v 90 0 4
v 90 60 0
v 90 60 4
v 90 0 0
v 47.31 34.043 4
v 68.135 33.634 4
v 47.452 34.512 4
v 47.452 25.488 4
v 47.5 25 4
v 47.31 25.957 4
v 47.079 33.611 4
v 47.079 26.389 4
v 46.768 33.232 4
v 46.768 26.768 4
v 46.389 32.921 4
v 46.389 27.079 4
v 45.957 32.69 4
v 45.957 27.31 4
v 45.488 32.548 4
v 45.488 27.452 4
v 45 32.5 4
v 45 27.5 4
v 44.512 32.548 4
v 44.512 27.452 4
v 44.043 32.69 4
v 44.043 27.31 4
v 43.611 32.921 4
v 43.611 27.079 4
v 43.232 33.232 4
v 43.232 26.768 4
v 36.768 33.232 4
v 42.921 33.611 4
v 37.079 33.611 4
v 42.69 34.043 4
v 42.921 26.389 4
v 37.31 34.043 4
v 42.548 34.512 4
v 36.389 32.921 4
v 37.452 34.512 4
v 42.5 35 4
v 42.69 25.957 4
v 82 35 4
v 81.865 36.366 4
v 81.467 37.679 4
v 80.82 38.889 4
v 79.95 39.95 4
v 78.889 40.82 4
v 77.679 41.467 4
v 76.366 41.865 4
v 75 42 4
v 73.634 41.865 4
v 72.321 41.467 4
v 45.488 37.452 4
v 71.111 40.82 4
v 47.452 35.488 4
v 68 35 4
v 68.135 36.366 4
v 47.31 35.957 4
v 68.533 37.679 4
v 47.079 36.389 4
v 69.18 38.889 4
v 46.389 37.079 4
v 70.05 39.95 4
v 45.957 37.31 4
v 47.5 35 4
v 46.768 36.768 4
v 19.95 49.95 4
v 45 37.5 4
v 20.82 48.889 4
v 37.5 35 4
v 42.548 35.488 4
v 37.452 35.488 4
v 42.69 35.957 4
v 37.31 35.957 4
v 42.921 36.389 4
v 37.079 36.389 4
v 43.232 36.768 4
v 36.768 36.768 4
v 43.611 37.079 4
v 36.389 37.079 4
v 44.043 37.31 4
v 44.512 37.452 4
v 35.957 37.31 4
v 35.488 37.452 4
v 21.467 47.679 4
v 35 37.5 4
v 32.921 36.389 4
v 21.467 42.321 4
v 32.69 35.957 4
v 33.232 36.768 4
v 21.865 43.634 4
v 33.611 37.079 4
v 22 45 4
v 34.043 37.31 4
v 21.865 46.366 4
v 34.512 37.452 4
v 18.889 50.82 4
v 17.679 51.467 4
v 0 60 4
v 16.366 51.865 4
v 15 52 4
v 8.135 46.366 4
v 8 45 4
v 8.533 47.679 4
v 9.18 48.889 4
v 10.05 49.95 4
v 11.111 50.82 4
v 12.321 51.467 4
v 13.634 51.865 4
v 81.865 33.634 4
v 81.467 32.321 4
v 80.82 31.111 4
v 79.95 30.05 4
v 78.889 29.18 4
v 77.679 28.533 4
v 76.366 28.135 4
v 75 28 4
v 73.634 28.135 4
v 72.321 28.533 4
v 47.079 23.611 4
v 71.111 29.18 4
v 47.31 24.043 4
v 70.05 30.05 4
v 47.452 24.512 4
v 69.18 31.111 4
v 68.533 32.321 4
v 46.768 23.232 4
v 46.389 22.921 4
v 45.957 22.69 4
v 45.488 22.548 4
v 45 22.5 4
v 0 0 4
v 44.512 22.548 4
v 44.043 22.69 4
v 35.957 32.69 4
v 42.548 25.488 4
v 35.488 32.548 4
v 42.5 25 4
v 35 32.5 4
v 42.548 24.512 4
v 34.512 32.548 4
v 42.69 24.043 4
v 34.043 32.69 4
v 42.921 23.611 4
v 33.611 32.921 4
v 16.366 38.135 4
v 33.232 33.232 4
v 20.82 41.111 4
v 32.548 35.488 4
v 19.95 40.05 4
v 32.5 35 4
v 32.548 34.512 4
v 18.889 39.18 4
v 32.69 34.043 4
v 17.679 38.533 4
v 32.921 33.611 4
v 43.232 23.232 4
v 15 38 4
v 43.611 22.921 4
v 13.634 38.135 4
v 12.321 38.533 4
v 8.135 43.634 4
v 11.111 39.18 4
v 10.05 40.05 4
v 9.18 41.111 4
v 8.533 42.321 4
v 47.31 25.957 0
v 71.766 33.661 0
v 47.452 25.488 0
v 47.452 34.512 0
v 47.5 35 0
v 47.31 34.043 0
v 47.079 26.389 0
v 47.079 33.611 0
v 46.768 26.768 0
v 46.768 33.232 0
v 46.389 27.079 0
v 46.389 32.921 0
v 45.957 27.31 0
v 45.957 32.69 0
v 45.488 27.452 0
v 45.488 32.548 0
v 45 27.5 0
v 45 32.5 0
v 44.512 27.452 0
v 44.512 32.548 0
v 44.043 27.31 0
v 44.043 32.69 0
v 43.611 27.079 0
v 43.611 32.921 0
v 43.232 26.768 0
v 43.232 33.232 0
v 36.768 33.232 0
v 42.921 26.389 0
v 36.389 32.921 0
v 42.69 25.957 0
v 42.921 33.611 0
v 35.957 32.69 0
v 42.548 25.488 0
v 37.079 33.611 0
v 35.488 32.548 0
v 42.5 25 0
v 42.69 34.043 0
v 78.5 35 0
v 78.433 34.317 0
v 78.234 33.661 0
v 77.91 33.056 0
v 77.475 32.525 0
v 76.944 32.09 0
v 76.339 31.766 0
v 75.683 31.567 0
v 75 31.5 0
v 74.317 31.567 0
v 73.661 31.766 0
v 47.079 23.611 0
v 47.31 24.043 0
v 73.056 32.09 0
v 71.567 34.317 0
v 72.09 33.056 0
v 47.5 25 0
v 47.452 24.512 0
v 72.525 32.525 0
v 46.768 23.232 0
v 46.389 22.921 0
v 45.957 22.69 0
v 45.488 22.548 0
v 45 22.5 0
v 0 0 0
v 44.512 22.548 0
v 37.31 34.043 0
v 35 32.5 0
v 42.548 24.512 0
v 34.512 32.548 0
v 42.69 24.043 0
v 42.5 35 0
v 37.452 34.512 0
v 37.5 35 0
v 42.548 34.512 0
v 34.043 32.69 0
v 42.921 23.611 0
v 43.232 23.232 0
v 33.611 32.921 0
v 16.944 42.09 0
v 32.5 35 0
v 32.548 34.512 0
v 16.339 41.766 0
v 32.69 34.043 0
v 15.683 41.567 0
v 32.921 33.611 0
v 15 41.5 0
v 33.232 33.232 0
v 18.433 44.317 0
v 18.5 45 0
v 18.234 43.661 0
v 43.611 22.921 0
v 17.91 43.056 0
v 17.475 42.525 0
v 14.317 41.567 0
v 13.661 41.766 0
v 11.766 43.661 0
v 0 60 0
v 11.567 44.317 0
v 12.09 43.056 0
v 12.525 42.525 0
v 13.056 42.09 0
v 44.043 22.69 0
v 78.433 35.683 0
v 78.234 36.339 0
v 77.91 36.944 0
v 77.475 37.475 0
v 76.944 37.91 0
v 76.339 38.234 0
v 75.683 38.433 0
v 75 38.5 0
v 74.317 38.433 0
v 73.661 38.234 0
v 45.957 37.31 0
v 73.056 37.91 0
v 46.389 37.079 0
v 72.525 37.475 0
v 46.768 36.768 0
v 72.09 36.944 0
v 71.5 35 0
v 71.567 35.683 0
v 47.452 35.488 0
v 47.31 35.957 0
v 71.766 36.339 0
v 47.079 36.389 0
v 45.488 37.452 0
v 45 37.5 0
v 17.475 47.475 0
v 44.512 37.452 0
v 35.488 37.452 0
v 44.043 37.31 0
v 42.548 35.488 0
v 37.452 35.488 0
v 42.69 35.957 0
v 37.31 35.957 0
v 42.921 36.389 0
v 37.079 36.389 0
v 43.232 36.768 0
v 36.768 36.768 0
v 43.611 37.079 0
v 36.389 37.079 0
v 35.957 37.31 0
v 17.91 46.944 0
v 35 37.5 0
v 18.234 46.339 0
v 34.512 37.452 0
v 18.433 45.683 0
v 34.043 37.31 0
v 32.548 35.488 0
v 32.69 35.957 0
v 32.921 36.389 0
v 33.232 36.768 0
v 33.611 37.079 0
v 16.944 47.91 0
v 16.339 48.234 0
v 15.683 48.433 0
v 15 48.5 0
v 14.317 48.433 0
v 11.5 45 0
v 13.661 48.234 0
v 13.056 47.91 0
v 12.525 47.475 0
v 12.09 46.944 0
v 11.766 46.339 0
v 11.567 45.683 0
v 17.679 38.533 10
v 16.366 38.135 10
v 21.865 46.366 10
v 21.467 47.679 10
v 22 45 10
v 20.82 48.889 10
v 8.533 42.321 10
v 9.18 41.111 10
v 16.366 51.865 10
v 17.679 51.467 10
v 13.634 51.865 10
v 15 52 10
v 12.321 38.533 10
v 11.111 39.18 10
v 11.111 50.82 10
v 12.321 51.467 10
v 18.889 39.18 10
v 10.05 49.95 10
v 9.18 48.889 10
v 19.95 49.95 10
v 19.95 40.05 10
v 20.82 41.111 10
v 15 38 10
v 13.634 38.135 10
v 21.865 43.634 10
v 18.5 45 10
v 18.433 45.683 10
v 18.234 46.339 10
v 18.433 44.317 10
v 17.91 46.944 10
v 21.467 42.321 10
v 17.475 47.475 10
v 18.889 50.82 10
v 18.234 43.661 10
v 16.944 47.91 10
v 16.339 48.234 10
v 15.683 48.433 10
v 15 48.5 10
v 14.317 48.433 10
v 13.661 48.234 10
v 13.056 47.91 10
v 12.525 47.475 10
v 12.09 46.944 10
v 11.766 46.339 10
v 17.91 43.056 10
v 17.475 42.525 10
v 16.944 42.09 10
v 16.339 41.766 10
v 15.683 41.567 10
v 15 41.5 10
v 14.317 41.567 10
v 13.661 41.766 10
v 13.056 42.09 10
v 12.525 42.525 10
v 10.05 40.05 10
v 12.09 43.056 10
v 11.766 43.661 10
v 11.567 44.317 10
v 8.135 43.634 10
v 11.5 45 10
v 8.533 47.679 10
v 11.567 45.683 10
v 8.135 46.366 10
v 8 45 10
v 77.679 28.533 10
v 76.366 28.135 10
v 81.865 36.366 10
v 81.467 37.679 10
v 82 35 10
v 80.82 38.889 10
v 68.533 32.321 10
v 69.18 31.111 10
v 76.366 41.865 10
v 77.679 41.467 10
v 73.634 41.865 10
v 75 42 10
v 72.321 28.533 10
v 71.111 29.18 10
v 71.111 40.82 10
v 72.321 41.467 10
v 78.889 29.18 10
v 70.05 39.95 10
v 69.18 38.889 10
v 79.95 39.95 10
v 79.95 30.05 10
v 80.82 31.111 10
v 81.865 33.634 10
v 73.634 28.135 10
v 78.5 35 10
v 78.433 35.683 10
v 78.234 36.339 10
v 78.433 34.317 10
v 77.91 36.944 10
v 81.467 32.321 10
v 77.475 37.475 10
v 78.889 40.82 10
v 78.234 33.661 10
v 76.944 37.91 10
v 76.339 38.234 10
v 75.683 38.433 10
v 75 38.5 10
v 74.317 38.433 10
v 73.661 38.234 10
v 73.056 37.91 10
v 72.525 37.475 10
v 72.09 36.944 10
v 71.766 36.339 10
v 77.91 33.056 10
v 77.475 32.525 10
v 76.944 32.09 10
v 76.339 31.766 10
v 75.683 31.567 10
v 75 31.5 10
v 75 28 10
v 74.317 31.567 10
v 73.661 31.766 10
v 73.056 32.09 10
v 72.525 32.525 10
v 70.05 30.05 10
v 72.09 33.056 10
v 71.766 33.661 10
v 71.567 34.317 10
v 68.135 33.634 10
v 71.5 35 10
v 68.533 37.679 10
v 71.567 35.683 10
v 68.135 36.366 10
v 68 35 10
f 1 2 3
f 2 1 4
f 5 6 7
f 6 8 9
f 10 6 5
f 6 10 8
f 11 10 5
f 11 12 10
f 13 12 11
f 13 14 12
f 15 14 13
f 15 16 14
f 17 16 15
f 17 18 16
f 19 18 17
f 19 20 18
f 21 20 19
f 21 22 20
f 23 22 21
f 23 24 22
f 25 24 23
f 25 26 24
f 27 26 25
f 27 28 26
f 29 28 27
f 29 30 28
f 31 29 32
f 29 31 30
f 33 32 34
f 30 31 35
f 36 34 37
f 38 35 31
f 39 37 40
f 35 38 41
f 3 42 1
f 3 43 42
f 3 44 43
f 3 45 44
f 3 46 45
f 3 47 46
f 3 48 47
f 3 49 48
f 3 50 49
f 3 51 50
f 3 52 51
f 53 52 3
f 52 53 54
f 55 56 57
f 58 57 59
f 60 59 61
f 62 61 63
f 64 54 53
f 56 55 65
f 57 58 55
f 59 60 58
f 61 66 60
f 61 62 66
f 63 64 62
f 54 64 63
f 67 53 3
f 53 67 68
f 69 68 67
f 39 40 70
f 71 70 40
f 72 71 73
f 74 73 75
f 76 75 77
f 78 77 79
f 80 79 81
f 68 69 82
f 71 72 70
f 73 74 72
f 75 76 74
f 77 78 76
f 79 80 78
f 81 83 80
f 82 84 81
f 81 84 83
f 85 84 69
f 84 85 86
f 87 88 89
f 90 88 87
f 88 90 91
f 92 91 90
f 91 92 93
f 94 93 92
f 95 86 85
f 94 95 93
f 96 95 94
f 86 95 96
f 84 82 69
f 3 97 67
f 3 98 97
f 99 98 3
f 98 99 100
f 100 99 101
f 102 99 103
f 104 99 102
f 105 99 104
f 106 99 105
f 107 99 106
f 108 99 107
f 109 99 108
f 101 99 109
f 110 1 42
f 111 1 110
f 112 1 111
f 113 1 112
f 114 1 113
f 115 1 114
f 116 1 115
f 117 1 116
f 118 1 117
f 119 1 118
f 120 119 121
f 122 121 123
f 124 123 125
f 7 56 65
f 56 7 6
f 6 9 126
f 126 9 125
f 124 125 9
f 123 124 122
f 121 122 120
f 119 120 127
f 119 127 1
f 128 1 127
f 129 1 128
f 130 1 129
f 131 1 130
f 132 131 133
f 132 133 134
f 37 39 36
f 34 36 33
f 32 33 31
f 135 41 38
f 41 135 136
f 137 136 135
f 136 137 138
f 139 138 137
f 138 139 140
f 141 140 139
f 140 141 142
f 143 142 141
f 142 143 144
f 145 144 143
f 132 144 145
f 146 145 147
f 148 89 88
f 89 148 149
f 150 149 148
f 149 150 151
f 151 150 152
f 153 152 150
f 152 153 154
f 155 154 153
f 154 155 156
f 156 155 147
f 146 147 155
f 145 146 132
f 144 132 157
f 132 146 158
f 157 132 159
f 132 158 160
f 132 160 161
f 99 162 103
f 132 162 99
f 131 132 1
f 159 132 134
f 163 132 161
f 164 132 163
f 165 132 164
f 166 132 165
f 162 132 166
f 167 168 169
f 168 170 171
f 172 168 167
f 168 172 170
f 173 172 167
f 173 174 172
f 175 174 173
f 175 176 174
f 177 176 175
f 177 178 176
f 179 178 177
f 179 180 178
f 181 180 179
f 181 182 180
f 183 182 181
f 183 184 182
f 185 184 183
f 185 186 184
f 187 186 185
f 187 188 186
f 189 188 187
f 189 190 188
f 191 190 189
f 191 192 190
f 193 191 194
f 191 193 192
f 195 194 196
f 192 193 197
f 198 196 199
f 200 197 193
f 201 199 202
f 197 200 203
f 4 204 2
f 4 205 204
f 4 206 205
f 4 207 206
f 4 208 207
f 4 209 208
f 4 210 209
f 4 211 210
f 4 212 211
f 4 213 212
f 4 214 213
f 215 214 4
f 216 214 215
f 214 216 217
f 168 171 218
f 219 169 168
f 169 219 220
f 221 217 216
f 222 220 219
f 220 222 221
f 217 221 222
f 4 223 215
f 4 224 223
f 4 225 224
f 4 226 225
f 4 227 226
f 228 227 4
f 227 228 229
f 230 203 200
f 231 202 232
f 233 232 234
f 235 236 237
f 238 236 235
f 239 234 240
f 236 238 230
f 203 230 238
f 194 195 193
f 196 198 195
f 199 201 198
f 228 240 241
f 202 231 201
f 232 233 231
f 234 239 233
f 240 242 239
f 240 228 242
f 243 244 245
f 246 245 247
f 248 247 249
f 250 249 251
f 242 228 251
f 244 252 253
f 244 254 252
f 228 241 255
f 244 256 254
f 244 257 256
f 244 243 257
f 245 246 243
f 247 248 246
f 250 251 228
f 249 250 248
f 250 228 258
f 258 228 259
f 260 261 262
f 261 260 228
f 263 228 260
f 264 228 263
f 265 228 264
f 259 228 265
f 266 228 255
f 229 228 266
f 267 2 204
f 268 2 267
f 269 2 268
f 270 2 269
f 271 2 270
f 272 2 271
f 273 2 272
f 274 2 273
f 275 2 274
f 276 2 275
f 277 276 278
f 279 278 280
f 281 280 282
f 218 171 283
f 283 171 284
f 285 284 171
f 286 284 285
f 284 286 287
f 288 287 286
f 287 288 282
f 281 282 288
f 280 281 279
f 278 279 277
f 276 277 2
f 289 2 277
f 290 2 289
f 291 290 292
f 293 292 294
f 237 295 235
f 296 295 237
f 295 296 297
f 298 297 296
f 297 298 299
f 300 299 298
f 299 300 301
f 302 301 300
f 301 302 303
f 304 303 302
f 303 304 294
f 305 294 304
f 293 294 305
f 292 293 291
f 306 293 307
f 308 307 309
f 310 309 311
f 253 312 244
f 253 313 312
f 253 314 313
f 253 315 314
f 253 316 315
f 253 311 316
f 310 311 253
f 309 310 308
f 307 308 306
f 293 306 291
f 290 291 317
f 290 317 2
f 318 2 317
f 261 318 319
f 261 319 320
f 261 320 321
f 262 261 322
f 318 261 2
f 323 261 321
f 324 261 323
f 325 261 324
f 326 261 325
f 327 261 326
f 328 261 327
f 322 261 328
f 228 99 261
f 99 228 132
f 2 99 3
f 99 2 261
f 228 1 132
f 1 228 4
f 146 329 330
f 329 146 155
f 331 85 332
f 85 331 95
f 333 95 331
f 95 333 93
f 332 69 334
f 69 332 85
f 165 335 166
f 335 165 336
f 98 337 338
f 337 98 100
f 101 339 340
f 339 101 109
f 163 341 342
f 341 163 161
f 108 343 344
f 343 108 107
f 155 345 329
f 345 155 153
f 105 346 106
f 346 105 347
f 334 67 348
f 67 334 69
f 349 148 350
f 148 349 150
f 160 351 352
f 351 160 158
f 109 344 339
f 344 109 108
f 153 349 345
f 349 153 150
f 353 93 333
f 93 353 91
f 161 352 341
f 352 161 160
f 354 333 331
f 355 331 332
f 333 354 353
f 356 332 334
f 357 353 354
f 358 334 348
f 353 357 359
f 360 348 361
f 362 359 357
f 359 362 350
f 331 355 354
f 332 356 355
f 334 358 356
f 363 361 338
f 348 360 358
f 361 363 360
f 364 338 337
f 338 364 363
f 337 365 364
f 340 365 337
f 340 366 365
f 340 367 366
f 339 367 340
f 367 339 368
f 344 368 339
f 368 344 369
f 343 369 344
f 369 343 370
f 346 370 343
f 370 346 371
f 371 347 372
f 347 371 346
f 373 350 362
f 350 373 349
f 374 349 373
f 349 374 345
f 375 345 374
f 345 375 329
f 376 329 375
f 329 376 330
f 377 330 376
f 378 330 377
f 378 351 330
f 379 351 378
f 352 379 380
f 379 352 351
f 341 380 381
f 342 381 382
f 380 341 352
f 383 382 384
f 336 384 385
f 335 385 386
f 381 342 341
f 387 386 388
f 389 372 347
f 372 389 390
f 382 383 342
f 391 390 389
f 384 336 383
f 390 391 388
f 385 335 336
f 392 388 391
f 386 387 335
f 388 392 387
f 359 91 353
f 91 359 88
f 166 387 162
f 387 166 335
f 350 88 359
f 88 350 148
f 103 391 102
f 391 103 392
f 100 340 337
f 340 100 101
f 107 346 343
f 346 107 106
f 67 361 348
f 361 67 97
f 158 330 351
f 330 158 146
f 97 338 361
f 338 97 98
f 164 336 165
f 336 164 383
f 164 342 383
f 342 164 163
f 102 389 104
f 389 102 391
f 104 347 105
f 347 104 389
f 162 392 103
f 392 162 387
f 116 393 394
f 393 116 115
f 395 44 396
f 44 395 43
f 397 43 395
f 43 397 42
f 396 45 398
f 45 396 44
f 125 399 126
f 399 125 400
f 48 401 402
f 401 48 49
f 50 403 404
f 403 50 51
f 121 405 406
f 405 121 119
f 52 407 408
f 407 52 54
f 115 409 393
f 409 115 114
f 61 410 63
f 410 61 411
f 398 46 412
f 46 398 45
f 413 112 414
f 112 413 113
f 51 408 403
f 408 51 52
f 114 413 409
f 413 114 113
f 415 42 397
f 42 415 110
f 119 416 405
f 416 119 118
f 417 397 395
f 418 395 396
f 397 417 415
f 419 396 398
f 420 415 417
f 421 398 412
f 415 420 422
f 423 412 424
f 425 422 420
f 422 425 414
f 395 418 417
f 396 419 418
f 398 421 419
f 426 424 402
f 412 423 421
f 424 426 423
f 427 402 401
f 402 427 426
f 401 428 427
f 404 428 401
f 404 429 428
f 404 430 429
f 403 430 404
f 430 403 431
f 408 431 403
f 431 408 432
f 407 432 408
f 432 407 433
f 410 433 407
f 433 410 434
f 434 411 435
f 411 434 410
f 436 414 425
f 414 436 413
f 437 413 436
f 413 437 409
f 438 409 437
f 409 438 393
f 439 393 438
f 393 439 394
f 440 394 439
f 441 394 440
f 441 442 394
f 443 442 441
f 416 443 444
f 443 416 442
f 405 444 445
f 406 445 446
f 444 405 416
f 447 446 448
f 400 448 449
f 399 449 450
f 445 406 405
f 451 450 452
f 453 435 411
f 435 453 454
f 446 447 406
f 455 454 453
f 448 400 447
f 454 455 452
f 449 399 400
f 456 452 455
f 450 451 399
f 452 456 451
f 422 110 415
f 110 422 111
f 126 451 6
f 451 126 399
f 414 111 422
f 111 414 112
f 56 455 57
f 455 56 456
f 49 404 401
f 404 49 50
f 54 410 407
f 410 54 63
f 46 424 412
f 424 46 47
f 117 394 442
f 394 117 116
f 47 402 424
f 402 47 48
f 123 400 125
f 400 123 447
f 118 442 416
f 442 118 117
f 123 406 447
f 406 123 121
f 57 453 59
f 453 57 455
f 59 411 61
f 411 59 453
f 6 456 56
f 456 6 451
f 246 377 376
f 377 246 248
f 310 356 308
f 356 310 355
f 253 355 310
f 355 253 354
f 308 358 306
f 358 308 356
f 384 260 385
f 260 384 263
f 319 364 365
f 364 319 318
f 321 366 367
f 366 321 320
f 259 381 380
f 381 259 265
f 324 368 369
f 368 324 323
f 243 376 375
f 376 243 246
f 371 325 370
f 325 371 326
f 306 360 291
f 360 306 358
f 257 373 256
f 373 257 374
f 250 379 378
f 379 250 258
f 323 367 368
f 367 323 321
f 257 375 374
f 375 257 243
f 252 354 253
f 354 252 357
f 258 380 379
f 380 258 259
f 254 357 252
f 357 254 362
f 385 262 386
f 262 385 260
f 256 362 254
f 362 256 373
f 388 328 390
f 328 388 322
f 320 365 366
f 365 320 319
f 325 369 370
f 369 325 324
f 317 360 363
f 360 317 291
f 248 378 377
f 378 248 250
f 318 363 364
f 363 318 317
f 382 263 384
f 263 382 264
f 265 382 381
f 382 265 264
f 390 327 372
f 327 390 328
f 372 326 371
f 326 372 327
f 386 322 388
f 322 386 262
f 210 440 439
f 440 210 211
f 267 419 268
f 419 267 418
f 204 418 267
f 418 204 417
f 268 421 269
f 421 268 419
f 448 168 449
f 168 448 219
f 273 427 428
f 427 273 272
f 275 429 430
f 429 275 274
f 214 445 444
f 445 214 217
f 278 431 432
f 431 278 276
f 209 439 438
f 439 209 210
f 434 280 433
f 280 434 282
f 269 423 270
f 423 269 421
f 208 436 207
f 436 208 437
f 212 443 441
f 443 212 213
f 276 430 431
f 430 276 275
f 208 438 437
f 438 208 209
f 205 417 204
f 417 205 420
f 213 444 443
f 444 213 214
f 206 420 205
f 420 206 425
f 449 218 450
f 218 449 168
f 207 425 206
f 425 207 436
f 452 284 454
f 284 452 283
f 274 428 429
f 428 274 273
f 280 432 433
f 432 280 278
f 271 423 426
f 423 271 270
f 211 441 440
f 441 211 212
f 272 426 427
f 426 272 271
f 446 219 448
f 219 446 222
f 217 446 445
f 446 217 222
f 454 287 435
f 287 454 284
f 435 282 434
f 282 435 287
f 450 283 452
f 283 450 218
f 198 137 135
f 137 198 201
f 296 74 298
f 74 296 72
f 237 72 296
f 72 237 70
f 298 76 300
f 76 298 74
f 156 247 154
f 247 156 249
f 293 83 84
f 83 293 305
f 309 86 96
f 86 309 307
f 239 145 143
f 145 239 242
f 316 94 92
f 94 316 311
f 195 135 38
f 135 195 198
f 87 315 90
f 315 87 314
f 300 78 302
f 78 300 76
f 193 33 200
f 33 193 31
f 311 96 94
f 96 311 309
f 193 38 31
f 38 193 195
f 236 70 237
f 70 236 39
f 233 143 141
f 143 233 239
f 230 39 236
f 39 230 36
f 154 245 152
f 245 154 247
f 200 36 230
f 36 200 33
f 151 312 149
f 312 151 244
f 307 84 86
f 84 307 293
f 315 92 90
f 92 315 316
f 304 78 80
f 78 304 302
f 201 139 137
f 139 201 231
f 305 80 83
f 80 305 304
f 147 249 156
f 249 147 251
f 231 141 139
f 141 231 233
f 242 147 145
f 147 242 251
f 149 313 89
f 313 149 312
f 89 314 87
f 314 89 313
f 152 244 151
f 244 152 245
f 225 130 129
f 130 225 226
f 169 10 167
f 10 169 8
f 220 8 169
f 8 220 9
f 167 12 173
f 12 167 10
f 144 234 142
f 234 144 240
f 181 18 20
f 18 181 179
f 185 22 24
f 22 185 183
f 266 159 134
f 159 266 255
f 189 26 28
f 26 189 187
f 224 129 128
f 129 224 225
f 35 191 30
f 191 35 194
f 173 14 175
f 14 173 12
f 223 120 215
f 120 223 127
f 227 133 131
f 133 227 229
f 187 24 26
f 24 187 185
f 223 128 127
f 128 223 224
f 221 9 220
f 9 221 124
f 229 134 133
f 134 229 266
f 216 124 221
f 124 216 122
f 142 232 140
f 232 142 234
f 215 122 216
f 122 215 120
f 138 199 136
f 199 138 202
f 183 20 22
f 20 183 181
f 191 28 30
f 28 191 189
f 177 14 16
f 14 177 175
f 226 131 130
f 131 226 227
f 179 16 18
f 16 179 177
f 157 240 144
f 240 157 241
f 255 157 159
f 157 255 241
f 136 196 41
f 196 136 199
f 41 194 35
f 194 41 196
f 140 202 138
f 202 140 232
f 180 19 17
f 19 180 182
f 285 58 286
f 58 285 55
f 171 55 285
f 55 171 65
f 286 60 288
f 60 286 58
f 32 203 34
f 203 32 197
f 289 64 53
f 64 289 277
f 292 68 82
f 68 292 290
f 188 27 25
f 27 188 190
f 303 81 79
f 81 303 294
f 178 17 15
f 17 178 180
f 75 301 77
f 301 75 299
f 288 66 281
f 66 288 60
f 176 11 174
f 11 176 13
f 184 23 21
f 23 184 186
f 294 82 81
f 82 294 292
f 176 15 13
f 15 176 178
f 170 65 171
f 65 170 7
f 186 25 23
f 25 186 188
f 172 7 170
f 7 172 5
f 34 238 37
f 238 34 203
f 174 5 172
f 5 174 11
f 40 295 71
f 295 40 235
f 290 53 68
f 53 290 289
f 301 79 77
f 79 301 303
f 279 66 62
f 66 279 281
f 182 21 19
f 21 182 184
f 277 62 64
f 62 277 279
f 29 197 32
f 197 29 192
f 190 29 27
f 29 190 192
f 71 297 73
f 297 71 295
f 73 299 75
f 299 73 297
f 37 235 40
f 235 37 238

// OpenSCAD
$fn = 32;

// ----------------------------------------------------------------------
// Mixed field: bosses and holes at given coordinates
// ----------------------------------------------------------------------

// --- parameters (mm) ---
plate_l = 90;             // plate length, X
plate_w = 60;             // plate width, Y
plate_t = 4;              // plate thickness, Z
boss_d = 14;              // boss diameter
boss_h = 6;               // boss height above the plate
hole_d = 5;               // through hole diameter
fit_tol = 0.05;           // tolerance for press fits, mm
free_tol = 0.3;           // tolerance for clearance fits, mm

total_h = plate_t + boss_h;  // overall height

difference() {
  union() {
    cube([plate_l, plate_w, plate_t]);
    translate([15, 45, plate_t]) cylinder(h = boss_h, d = boss_d);
    translate([75, 35, plate_t]) cylinder(h = boss_h, d = boss_d);
  }
  translate([15, 45, -1]) cylinder(h = total_h + 2, d = boss_d / 2);
  translate([75, 35, -1]) cylinder(h = total_h + 2, d = boss_d / 2);
  translate([35, 35, -1]) cylinder(h = plate_t + 2, d = hole_d);
  translate([45, 25, -1]) cylinder(h = plate_t + 2, d = hole_d);
  translate([45, 35, -1]) cylinder(h = plate_t + 2, d = hole_d);
}
